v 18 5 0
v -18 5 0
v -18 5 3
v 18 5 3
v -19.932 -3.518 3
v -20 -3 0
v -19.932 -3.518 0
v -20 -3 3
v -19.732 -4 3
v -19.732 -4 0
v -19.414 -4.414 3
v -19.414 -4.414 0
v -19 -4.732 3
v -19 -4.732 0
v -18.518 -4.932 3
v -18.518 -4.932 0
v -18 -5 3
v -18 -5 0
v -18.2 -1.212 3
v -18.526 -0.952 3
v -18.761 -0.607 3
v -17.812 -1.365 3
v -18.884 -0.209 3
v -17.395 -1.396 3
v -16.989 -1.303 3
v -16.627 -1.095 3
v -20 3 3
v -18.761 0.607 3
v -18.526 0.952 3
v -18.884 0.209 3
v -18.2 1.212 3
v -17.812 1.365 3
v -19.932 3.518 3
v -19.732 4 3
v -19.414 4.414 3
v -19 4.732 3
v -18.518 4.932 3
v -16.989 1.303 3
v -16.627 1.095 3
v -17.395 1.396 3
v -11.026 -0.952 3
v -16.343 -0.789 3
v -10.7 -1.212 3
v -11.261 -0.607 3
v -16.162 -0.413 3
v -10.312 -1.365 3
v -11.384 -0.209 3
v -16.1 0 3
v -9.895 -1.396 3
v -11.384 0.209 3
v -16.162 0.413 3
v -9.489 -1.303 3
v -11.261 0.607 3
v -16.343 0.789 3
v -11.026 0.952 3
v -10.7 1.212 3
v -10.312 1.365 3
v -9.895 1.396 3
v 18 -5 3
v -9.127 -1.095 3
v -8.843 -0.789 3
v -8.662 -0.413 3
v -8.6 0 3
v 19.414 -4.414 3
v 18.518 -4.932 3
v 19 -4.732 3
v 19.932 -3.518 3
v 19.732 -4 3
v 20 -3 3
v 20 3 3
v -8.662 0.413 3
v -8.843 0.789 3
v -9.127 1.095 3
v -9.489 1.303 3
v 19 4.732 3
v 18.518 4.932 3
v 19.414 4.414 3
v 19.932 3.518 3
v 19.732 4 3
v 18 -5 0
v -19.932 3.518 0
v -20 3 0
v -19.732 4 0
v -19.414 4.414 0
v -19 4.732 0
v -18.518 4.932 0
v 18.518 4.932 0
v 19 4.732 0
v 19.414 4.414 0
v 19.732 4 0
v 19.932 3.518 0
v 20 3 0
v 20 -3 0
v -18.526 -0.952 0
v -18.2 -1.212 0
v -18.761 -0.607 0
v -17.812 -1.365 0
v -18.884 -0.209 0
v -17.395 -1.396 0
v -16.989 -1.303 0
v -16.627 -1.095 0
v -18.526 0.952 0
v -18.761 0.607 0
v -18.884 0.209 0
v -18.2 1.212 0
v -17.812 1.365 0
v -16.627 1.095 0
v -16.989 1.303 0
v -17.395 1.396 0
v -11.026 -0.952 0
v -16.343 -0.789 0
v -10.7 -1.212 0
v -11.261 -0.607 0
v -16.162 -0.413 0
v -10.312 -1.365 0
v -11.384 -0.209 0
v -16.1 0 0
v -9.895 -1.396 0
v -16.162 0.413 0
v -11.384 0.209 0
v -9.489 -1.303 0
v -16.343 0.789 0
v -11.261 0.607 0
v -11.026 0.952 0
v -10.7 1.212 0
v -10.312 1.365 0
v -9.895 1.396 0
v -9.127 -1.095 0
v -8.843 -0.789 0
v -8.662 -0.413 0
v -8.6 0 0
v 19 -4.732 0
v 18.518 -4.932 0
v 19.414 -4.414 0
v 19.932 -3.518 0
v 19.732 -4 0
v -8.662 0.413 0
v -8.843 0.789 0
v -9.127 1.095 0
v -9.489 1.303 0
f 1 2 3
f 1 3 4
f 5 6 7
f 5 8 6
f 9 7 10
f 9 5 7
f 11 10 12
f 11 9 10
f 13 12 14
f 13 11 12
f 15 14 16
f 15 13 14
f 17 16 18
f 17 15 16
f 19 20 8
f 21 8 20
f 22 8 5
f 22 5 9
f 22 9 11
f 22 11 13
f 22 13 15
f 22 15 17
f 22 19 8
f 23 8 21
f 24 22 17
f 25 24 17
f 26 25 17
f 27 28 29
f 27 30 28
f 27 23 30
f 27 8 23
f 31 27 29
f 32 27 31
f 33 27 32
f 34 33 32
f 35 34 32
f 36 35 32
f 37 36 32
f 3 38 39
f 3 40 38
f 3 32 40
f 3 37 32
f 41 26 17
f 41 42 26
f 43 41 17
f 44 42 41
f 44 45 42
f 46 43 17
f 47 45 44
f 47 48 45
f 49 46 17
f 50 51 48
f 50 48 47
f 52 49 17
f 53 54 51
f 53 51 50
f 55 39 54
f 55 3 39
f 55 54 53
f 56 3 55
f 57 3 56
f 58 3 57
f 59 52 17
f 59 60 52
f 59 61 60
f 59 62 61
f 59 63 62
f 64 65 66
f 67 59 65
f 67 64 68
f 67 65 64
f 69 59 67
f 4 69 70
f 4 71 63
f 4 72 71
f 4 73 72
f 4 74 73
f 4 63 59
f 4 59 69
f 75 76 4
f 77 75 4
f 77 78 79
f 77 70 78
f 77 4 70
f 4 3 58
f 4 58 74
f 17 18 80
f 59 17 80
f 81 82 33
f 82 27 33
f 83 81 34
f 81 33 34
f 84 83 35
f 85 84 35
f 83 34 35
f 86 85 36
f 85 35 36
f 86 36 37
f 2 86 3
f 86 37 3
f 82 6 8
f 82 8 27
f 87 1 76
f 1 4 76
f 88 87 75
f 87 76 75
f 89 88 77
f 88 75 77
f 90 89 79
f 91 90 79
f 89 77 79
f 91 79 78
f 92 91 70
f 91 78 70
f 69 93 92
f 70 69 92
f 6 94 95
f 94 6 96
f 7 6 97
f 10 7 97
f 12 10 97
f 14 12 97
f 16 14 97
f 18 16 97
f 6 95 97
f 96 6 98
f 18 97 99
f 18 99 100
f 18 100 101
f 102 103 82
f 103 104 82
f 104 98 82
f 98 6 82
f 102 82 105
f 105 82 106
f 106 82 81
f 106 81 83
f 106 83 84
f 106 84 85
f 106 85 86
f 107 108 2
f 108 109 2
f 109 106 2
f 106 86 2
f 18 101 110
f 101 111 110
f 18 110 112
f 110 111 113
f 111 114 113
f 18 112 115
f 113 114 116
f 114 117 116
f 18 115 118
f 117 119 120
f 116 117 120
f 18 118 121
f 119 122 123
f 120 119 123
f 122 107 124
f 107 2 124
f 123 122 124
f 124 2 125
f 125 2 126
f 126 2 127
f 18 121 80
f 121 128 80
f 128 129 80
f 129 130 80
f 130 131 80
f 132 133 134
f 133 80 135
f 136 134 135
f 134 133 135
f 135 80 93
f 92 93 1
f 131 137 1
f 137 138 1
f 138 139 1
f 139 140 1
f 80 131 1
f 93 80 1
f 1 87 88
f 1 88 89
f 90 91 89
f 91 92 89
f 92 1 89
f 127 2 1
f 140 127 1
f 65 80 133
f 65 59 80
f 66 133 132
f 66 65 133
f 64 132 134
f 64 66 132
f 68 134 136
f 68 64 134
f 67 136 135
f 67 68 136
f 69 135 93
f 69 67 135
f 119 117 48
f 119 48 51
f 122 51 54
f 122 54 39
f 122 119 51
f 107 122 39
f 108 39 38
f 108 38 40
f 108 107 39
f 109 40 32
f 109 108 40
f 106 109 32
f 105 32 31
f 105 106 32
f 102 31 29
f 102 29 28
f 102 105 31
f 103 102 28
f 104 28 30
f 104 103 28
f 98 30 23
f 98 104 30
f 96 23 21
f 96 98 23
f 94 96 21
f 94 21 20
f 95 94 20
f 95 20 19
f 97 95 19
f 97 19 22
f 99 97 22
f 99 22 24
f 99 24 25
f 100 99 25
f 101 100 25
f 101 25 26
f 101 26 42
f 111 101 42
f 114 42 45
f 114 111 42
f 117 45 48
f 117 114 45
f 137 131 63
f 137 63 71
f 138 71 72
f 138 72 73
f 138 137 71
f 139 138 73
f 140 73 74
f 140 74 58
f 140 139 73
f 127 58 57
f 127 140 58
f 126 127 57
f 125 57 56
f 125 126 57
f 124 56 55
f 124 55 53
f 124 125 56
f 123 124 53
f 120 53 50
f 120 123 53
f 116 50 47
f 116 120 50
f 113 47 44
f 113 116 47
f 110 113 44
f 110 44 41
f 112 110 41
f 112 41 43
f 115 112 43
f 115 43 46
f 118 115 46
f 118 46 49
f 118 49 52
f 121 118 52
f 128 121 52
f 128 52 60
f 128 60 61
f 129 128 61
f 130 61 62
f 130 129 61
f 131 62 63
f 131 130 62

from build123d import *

# Parameters (mm, degrees)
ESQUISSE1_W        = 40
ESQUISSE1_H        = 10
ESQUISSE1_R        = 1.4
BOSS_EXTRU_1_DEPTH = 3
CONG_1_R           = 2


with BuildPart() as part:
    # Esquisse1 → Boss.-Extru.1 (new body)
    with BuildSketch(Plane.XY):
        Rectangle(ESQUISSE1_W, ESQUISSE1_H)
        with Locations((-10, 0)):
            Circle(ESQUISSE1_R, mode=Mode.SUBTRACT)
        with Locations((-17.5, 0)):
            Circle(ESQUISSE1_R, mode=Mode.SUBTRACT)
    extrude(amount=BOSS_EXTRU_1_DEPTH)

    # Congé1
    cong_1_edges = [part.edges().sort_by_distance(p)[0] for p in [
        (20, -5, 1.5),
        (-20, -5, 1.5),
        (-20, 5, 1.5),
        (20, 5, 1.5),
    ]]
    fillet(cong_1_edges, radius=CONG_1_R)


solid = part.part
